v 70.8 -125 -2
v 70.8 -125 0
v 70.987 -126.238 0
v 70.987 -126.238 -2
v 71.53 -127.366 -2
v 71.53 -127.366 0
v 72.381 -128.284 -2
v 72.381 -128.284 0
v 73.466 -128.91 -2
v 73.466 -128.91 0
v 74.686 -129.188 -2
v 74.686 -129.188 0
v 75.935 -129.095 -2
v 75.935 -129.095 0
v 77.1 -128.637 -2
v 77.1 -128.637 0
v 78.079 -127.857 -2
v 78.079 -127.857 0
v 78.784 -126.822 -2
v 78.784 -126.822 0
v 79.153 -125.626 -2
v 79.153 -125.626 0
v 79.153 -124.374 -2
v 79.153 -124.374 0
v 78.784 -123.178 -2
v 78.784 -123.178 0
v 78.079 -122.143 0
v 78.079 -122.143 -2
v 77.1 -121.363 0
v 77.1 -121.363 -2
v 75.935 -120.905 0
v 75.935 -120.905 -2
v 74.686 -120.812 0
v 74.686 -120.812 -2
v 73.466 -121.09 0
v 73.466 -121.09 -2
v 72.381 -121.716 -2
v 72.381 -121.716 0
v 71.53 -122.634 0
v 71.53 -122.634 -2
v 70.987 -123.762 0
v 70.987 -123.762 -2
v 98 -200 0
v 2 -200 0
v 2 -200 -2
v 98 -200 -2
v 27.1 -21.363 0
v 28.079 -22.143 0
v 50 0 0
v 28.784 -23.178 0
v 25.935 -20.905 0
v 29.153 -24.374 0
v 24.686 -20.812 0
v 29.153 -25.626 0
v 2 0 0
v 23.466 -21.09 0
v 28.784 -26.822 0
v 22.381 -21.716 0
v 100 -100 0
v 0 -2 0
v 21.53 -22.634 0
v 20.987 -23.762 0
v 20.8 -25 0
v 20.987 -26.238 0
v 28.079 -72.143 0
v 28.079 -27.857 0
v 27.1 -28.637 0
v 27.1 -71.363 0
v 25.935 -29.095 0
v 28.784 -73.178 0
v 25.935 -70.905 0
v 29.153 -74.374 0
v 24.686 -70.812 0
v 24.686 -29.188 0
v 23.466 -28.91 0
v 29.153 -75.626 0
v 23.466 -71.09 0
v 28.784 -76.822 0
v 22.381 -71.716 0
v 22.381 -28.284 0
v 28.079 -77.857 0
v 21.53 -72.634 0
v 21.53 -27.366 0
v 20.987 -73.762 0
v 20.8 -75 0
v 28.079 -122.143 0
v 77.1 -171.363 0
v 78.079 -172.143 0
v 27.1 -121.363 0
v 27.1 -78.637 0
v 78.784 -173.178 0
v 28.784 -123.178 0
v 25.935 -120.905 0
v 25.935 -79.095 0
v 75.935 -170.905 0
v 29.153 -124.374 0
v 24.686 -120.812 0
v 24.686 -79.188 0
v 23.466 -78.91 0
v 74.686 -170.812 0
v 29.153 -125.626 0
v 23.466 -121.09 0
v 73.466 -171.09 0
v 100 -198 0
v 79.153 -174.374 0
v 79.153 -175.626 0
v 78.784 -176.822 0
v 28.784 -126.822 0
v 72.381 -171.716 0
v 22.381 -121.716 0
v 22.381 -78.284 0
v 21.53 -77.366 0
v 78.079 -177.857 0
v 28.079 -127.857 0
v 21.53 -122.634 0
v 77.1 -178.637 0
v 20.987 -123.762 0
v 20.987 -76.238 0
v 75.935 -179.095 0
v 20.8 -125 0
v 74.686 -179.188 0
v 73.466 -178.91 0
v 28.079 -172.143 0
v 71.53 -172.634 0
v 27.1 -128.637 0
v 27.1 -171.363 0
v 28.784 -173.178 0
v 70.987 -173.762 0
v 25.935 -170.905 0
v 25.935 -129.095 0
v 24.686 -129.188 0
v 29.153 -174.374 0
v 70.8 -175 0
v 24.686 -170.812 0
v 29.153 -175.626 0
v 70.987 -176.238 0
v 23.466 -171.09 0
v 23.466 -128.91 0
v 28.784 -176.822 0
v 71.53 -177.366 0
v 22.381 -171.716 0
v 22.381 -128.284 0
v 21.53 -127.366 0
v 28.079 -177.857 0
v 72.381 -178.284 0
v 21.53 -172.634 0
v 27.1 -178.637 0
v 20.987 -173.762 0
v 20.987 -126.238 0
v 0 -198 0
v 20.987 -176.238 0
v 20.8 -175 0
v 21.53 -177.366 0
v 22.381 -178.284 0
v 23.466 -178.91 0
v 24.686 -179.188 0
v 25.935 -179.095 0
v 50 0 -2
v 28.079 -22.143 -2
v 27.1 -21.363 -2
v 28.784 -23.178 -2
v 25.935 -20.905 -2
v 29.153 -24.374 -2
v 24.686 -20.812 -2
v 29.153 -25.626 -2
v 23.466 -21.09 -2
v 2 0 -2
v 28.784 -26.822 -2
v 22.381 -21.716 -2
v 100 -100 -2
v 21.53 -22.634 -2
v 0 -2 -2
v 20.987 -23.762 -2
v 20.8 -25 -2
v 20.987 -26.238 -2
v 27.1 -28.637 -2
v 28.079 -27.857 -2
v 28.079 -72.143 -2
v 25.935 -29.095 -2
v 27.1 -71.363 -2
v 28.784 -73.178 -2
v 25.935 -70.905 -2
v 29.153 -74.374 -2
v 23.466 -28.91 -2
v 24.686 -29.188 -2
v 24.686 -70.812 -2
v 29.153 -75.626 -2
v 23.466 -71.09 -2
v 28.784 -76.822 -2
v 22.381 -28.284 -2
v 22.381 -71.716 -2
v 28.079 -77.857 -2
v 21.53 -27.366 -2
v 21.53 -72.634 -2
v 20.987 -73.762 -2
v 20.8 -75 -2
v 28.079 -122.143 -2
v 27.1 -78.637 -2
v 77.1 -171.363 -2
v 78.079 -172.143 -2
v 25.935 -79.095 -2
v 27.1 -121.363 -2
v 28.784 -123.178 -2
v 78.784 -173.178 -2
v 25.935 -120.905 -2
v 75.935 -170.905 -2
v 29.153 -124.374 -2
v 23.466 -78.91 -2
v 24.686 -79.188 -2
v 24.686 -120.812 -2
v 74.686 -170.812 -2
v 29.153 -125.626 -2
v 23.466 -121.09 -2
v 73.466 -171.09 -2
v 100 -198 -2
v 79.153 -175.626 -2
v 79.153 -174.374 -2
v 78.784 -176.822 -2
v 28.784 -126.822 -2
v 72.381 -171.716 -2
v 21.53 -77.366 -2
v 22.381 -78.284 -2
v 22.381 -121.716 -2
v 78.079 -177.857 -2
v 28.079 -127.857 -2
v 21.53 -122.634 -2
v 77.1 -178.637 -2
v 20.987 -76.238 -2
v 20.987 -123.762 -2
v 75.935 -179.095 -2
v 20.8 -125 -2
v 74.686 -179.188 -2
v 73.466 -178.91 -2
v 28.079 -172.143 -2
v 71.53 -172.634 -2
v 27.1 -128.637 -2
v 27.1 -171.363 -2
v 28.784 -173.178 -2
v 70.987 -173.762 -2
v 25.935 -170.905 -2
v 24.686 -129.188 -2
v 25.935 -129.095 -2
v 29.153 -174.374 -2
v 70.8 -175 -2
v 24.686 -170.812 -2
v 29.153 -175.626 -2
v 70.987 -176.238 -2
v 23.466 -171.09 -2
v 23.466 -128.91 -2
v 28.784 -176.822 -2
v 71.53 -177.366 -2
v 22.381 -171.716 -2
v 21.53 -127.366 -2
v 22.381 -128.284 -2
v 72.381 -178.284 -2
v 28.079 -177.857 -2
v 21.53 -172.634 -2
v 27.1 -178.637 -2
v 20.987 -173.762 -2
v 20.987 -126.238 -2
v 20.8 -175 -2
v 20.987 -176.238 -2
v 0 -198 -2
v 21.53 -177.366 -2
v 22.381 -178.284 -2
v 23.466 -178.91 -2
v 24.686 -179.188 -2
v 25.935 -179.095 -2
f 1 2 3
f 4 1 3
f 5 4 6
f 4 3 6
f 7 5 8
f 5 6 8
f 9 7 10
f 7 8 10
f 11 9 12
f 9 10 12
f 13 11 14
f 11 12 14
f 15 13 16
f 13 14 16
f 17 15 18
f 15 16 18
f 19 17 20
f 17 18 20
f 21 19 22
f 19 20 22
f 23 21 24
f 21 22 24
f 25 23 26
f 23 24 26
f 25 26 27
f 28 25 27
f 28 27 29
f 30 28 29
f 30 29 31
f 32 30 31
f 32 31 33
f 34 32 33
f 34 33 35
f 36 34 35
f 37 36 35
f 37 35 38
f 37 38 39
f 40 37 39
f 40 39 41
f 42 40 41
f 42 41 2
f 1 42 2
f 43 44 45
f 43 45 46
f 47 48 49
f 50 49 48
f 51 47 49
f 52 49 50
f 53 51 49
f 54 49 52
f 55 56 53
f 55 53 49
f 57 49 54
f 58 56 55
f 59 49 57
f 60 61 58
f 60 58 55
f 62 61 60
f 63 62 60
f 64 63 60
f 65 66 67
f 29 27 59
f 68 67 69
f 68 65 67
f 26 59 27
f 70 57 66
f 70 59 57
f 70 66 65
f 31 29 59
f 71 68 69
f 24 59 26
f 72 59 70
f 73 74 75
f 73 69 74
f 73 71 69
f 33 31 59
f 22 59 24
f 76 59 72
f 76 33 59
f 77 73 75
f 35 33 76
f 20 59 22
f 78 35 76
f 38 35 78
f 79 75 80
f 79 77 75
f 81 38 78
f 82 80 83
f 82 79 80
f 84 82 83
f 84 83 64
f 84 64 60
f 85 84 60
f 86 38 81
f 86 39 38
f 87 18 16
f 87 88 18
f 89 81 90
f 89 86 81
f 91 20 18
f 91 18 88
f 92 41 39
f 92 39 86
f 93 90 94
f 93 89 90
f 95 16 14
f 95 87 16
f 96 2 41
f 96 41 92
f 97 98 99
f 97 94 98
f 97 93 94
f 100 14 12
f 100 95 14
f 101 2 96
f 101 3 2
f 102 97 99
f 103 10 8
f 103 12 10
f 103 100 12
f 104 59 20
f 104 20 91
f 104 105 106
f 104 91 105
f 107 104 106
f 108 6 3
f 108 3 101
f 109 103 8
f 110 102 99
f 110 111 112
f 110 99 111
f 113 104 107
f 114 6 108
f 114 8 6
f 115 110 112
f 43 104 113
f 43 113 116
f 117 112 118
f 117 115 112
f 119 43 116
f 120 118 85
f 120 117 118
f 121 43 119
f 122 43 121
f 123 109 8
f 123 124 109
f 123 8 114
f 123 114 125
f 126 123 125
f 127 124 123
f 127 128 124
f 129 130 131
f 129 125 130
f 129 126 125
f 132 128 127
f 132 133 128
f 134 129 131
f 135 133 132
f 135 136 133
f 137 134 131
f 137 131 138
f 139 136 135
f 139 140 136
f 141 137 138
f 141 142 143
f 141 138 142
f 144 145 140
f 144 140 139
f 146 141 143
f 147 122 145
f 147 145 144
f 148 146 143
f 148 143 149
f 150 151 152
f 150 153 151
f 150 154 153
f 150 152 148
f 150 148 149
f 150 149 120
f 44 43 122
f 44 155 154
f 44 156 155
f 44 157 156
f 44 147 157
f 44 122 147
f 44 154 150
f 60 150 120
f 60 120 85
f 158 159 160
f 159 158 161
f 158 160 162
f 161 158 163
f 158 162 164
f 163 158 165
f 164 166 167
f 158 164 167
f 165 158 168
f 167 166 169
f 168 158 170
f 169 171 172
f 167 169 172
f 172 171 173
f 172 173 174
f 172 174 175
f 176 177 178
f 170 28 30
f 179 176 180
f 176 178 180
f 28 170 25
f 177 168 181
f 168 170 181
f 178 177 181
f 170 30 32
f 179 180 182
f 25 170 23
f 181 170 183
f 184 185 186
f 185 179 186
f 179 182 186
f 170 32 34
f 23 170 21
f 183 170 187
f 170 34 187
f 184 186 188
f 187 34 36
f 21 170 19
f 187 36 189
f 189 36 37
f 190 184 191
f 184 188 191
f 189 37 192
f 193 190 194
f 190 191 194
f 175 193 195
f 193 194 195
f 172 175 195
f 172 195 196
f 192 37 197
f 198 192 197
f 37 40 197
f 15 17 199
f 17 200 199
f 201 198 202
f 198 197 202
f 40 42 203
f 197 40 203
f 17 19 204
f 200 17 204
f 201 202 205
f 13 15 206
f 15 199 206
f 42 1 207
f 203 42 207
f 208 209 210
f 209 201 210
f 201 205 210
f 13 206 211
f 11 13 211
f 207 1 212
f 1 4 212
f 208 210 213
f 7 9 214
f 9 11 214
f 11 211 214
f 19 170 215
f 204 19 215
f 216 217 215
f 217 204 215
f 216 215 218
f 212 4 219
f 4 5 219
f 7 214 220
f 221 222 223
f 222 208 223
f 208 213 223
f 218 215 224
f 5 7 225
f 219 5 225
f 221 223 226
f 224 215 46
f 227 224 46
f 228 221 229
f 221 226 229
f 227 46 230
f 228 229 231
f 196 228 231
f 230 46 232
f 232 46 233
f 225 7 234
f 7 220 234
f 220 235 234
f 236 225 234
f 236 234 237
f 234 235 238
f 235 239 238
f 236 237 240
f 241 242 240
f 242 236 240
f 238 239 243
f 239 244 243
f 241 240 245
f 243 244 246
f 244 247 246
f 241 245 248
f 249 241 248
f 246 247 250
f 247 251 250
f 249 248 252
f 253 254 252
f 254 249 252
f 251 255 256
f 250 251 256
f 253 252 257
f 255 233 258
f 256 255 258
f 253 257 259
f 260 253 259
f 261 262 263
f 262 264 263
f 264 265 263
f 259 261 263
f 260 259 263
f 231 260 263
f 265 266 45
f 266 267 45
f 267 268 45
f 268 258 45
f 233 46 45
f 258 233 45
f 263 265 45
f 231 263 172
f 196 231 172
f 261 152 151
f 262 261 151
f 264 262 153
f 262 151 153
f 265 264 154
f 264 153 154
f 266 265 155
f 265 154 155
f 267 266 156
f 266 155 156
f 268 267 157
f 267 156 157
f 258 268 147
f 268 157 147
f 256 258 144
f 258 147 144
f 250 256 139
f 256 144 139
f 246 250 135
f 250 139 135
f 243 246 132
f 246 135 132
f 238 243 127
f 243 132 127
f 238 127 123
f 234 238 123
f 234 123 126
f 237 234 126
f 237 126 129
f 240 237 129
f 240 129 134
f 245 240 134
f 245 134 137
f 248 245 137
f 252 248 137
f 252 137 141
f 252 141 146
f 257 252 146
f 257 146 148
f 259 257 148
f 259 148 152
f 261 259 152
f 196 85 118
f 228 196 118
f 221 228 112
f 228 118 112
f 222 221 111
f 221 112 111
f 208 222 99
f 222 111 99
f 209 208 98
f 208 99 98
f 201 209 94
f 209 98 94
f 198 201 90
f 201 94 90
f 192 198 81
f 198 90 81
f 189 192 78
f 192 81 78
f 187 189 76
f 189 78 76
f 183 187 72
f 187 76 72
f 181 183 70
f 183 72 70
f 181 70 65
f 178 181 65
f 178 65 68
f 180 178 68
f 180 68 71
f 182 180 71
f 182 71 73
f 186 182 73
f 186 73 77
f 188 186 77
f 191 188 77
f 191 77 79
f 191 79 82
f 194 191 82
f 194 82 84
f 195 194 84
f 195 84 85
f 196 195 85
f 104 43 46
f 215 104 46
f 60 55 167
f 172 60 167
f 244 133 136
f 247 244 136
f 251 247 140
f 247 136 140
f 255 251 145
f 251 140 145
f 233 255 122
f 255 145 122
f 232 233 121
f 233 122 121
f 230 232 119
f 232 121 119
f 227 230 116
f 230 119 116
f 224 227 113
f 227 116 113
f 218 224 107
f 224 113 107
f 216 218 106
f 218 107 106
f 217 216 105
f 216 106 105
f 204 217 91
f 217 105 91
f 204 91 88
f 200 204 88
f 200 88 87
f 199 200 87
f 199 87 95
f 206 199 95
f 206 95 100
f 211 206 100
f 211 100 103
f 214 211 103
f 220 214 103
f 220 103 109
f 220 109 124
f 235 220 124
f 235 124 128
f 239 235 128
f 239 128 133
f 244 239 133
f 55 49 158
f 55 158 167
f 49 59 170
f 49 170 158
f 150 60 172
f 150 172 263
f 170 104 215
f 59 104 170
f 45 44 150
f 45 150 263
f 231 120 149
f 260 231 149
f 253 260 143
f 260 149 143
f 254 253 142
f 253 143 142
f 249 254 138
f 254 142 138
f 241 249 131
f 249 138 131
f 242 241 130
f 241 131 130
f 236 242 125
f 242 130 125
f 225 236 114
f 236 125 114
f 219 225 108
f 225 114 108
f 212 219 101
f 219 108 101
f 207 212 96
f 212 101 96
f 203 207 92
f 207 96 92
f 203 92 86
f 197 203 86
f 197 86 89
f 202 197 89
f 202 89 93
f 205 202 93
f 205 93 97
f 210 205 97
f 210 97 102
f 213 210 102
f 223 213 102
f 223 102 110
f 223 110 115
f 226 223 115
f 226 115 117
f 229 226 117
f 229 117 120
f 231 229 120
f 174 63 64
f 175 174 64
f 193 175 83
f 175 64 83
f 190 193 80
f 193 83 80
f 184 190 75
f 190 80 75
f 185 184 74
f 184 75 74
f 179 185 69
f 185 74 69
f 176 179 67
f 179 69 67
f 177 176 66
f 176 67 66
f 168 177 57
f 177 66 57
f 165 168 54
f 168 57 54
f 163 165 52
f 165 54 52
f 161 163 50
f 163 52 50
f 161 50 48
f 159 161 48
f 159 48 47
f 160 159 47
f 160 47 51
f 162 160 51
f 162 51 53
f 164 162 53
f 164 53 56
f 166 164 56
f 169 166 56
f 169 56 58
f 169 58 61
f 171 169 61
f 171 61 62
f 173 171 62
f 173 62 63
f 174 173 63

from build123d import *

# Parameters (mm, degrees)
EXTRUDE_1_DEPTH       = 2
HOLE_WIZARD_M81_D     = 8.4
HOLE_WIZARD_M81_DEPTH = 2
CHAMFER_1_SIZE        = 2


with BuildPart() as part:
    # Эскиз1 → Бобышка-Вытянуть1 (new body)
    with BuildSketch(Plane(origin=(0, 0, 0), x_dir=(1, 0, 0), z_dir=(0, 0, -1))):
        Polygon((0, 0), (0, 200), (100, 200), (100, 100), (50, 0), align=None)
    extrude(amount=EXTRUDE_1_DEPTH)

    # Отверстие с зазором M81
    with Locations(Plane(origin=(0, 0, -2), x_dir=(1, 0, 0), z_dir=(0, 0, -1))):
        with Locations((25, 175), (25, 125), (25, 75), (25, 25), (75, 175), (75, 125)):
            Hole(HOLE_WIZARD_M81_D / 2, depth=HOLE_WIZARD_M81_DEPTH)

    # Фаска1
    chamfer_1_edges = [part.edges().sort_by_distance(p)[0] for p in [
        (0, 0, -1),
        (0, -200, -1),
        (100, -200, -1),
    ]]
    chamfer(chamfer_1_edges, length=CHAMFER_1_SIZE)


solid = part.part
